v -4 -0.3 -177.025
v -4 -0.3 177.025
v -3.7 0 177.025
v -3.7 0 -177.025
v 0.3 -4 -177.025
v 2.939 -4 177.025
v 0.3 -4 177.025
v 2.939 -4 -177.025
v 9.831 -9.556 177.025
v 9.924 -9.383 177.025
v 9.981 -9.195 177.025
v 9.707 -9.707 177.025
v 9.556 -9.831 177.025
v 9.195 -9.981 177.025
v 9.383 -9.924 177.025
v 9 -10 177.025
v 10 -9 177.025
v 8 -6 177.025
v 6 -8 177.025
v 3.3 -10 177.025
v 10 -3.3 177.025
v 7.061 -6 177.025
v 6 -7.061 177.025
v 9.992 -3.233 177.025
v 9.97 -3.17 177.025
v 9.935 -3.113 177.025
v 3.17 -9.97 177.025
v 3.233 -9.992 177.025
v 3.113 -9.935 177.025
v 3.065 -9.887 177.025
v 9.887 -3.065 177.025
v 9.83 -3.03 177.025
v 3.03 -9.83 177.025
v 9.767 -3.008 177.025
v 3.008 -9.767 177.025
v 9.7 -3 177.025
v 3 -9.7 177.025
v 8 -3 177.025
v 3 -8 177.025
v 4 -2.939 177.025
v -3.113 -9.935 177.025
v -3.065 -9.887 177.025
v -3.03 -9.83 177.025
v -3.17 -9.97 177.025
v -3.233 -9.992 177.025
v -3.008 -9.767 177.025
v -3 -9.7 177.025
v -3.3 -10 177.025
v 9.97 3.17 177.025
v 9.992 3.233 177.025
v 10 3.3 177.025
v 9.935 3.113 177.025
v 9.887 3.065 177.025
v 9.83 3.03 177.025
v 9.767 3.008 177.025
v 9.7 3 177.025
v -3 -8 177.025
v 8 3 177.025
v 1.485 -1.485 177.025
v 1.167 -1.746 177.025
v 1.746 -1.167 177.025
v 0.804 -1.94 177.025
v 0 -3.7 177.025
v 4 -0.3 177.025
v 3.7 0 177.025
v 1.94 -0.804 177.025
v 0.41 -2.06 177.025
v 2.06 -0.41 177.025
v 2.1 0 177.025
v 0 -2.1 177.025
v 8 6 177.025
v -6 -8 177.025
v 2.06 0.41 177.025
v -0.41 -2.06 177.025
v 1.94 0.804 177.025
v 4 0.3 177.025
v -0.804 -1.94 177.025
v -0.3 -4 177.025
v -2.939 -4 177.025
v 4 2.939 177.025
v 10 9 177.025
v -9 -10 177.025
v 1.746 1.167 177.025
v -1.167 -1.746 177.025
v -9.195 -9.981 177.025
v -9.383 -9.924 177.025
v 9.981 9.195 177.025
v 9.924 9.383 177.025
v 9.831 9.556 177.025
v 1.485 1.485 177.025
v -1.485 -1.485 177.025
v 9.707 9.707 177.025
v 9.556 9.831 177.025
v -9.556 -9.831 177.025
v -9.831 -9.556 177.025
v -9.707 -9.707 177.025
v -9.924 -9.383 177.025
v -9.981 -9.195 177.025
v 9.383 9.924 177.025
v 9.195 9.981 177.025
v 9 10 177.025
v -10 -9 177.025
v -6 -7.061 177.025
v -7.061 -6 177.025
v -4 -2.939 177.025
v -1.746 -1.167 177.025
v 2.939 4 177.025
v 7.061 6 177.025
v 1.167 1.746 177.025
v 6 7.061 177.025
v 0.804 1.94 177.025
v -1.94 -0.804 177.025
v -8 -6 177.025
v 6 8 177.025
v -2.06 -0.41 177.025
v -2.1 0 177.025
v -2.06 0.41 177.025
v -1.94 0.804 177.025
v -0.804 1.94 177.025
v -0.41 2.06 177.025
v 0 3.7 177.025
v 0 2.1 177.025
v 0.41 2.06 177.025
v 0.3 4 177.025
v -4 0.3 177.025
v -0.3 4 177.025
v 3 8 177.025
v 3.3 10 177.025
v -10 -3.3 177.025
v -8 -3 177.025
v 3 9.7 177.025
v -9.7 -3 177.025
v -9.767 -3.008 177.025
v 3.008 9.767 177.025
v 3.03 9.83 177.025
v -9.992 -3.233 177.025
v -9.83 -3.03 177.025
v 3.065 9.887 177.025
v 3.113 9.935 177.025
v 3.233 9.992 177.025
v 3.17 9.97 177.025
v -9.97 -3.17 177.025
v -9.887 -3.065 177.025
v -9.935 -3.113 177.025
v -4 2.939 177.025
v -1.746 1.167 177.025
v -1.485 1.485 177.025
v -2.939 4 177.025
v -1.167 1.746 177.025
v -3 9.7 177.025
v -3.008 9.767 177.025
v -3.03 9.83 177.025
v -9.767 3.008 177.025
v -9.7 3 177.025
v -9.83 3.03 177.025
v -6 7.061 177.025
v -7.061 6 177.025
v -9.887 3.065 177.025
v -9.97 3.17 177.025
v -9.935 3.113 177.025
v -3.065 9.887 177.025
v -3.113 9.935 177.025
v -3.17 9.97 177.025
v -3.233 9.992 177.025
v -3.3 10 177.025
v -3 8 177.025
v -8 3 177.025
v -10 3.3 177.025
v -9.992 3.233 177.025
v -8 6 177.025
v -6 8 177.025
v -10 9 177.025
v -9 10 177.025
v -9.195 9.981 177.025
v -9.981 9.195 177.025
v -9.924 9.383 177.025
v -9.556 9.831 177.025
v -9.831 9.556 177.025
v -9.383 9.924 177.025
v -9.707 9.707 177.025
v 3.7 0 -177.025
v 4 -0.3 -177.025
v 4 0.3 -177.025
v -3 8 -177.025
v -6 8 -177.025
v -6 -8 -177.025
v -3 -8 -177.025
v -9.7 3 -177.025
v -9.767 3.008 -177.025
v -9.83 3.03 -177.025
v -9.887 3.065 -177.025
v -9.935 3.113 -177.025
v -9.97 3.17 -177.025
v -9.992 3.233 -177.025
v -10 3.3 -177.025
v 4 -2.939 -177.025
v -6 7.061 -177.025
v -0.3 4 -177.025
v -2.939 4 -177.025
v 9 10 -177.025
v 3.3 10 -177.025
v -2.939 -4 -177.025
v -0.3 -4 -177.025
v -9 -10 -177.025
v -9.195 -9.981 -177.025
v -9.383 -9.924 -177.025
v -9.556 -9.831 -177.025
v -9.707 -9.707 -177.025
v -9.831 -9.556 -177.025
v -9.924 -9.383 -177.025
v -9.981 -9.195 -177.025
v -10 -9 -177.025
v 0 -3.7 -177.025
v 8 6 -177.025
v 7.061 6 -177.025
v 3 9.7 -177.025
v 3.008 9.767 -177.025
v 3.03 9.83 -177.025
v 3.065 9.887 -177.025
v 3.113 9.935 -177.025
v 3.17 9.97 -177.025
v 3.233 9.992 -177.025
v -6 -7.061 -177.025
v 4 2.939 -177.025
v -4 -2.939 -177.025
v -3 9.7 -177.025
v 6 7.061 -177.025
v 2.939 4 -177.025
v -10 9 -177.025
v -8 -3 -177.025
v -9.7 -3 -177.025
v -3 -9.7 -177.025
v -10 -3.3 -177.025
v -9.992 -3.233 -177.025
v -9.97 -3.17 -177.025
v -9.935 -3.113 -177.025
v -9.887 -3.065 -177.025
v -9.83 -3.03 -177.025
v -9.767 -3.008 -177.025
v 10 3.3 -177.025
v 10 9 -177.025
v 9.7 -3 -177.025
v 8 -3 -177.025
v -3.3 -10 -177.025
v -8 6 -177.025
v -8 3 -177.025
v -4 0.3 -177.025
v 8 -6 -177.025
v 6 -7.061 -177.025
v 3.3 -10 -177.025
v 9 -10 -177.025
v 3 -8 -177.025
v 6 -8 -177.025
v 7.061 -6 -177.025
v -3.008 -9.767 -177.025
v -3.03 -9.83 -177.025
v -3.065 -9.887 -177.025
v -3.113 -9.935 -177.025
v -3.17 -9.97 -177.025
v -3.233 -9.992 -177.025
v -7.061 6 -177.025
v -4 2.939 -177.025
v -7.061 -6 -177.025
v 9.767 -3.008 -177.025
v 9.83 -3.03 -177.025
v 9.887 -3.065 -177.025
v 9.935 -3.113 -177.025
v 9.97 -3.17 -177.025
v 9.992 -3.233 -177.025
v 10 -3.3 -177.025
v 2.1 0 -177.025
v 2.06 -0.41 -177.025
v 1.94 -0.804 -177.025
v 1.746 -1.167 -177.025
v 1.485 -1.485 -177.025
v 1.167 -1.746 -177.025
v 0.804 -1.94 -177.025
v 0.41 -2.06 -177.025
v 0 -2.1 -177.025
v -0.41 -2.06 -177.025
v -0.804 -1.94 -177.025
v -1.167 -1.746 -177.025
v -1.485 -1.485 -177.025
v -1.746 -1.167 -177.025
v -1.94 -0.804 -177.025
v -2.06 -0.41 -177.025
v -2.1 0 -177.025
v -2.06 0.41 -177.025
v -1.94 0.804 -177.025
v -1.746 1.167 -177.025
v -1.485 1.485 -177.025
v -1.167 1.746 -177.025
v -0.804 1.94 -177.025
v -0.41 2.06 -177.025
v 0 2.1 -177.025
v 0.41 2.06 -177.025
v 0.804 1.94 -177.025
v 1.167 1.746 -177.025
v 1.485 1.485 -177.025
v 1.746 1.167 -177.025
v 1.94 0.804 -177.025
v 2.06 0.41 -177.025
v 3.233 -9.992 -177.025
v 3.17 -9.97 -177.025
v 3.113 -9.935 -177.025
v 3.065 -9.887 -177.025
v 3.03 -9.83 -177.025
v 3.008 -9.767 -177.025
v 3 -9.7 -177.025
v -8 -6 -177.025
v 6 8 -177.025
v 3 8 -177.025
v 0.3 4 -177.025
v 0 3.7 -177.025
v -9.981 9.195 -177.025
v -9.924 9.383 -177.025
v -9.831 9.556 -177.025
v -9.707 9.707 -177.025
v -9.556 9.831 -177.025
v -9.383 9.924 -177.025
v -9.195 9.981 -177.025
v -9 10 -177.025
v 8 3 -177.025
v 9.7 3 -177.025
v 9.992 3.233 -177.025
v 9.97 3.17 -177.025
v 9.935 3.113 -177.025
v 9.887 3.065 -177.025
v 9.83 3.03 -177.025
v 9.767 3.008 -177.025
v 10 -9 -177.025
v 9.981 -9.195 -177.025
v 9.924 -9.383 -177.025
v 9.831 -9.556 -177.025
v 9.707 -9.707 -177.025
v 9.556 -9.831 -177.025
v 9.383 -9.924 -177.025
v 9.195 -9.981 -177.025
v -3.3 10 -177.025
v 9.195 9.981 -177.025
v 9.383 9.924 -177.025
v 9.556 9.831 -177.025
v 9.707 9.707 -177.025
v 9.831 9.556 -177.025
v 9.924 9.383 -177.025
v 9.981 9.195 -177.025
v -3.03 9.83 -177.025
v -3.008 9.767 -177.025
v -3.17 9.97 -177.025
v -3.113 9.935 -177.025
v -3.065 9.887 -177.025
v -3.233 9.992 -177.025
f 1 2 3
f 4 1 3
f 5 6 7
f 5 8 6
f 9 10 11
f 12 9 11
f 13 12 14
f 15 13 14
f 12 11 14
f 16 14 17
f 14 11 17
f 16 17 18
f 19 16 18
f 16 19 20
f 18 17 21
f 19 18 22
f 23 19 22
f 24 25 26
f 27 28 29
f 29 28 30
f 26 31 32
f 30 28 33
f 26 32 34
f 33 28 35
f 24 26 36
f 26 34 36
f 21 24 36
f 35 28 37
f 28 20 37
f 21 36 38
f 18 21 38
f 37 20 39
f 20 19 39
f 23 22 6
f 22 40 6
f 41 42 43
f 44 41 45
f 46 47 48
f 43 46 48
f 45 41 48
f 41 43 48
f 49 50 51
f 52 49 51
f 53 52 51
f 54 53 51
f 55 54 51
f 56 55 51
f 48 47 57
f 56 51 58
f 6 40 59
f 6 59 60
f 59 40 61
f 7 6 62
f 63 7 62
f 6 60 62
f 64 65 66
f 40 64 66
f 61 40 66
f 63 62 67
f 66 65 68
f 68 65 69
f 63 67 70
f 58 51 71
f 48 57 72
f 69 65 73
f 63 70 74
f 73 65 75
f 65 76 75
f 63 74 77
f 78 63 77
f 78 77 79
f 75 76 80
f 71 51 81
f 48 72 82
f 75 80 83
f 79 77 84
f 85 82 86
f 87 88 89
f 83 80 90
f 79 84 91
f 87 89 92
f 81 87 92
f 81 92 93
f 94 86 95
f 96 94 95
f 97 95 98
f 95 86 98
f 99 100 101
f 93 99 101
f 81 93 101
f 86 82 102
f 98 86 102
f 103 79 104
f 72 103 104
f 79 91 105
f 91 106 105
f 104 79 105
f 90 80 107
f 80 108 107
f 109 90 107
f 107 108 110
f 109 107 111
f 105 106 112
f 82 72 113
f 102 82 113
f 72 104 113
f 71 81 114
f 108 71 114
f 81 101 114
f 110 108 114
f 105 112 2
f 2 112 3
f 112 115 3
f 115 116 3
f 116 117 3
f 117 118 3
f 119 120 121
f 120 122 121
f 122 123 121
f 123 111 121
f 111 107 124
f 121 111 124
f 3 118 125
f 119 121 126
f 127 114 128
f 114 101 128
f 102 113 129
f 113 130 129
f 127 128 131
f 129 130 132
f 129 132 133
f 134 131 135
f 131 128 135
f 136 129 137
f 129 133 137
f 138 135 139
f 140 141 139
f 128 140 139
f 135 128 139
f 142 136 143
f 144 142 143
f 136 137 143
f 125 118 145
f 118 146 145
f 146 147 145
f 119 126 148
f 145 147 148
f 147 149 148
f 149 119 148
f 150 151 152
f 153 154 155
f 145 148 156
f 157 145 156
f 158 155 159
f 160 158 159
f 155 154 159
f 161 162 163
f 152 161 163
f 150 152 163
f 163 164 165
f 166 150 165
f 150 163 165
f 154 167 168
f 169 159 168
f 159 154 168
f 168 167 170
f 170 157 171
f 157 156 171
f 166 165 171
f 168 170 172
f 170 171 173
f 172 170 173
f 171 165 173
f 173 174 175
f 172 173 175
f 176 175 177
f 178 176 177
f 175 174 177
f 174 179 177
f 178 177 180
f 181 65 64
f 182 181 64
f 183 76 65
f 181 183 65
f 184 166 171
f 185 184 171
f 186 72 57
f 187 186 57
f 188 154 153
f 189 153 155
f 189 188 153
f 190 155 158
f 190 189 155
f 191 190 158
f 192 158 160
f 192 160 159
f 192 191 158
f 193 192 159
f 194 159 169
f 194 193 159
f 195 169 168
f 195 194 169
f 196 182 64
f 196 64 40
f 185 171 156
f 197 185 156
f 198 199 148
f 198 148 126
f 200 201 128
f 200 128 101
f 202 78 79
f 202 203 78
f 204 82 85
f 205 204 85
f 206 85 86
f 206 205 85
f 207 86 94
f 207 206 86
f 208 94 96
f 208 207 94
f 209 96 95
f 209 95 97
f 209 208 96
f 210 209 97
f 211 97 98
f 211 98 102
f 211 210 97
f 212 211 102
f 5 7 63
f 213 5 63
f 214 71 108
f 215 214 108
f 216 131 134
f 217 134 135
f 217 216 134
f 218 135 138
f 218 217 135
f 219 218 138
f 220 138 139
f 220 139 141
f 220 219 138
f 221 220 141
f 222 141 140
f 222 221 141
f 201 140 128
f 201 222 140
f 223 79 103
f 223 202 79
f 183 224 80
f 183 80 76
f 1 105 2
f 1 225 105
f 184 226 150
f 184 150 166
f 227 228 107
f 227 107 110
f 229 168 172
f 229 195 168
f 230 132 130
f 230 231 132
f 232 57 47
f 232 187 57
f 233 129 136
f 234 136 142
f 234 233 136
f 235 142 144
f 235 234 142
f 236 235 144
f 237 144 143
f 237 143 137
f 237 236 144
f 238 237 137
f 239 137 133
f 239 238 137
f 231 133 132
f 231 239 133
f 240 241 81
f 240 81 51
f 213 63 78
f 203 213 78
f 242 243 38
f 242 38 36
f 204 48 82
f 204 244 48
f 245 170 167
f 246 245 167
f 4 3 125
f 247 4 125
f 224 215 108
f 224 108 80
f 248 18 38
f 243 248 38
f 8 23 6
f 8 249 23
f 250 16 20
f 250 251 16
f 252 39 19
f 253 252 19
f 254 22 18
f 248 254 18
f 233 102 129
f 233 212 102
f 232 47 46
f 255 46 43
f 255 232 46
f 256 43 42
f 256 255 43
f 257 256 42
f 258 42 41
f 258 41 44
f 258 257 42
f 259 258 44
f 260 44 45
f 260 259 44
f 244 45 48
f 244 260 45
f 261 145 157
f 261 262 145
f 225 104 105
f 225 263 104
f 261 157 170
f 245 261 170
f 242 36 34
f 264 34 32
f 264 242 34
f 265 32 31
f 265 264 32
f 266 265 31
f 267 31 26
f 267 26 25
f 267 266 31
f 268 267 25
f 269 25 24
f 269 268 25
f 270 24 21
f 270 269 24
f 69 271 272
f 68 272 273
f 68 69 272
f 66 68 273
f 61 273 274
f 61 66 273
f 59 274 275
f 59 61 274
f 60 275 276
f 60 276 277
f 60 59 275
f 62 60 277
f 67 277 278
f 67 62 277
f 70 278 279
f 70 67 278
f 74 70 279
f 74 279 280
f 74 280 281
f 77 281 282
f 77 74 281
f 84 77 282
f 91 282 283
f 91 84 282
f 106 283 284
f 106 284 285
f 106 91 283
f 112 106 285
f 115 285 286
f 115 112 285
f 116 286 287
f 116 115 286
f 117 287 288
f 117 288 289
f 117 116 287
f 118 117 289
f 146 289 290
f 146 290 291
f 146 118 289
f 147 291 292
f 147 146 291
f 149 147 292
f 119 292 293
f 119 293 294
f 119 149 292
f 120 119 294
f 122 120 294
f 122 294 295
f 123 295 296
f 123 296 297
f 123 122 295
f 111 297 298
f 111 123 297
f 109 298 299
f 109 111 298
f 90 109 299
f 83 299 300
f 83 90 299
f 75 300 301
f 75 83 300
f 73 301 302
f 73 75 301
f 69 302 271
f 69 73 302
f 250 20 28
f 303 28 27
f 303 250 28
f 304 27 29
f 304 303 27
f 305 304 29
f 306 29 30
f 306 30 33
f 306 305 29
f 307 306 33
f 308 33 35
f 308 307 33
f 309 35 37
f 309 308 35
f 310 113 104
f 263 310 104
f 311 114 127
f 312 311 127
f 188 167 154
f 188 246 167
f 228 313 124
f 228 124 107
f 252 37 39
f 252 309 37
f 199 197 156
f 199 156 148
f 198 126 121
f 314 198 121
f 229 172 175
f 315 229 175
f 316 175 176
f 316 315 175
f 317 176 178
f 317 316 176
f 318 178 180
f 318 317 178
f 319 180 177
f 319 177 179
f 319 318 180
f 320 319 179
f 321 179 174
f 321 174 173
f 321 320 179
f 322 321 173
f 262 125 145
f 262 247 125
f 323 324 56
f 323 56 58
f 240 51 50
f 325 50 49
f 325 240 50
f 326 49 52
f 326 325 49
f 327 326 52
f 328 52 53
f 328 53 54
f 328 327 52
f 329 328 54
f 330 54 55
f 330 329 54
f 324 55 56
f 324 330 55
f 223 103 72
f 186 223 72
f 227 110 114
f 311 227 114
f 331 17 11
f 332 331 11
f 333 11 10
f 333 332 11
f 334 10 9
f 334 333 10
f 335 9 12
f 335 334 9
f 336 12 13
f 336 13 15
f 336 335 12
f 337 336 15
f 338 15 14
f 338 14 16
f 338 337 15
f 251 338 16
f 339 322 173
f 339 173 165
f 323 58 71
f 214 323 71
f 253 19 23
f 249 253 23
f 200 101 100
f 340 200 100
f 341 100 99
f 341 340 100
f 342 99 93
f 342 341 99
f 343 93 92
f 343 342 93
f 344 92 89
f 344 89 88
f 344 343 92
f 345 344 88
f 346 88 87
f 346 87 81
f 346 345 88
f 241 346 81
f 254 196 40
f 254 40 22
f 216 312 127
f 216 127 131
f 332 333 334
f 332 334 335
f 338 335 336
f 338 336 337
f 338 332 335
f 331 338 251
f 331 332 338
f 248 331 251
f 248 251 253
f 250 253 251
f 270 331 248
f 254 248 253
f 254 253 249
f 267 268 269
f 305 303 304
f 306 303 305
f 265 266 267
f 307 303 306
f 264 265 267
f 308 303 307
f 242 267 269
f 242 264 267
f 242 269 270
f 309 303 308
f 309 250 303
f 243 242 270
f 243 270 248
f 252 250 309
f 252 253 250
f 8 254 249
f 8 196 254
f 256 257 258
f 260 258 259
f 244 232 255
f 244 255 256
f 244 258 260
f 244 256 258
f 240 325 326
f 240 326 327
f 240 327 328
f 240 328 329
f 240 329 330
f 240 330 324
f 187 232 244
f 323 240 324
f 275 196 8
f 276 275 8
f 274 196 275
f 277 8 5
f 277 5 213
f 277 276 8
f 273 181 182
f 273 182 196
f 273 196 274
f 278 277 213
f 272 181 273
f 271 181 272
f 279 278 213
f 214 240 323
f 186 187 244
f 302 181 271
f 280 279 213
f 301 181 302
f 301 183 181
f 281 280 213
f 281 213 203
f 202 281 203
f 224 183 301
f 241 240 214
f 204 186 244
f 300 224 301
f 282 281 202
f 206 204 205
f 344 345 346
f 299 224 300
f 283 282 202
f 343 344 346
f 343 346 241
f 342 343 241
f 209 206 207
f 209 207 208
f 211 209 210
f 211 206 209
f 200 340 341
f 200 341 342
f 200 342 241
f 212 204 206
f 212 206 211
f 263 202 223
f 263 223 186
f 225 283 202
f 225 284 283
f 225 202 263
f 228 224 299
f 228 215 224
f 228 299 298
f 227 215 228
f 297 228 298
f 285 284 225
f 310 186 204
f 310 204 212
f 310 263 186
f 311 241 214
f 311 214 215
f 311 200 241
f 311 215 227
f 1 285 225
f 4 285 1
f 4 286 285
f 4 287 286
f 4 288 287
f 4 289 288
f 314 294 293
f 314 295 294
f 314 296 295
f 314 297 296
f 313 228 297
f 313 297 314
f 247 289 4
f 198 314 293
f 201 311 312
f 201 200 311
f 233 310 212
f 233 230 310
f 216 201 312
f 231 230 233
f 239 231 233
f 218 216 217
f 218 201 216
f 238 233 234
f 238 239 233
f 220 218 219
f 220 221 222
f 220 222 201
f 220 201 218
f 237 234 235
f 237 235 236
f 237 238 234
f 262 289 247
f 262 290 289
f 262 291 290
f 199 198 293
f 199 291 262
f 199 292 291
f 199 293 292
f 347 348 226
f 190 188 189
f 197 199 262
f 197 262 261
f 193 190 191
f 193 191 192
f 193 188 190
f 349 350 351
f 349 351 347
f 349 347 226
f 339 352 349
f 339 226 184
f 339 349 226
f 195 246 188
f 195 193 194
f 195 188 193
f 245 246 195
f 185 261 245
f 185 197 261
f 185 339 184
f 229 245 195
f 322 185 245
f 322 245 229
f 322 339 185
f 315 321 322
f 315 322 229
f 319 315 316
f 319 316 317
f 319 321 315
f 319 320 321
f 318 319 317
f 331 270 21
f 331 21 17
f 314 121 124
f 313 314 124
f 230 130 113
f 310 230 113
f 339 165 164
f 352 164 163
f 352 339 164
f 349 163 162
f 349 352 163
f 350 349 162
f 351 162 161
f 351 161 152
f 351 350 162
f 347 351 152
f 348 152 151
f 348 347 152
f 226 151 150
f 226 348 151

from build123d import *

# Parameters (mm, degrees)
SKETCH1_R           = 2.1
BOSS_EXTRUDE1_DEPTH = 177.025


with BuildPart() as part:
    # Sketch1 → Boss-Extrude1 (new, symmetric)
    with BuildSketch(Plane(origin=(0, 0, 0), x_dir=(-1, 0, 0), z_dir=(0, 0, -1))):
        with BuildLine():
            Line((10, 3.3), (10, 9))
            ThreePointArc((10, 9), (9.707106781, 9.707106781), (9, 10))
            Line((9, 10), (3.3, 10))
            ThreePointArc((3.3, 10), (3.087867966, 9.912132034), (3, 9.7))
            Line((3, 9.7), (3, 8))
            Line((3, 8), (6, 8))
            Line((6, 8), (6, 7.060660172))
            Line((6, 7.060660172), (2.939339828, 4))
            Line((2.939339828, 4), (0.3, 4))
            Line((0.3, 4), (0, 3.7))
            Line((0, 3.7), (-0.3, 4))
            Line((-0.3, 4), (-2.939339828, 4))
            Line((-2.939339828, 4), (-6, 7.060660172))
            Line((-6, 7.060660172), (-6, 8))
            Line((-6, 8), (-3, 8))
            Line((-3, 8), (-3, 9.7))
            ThreePointArc((-3, 9.7), (-3.087867966, 9.912132034), (-3.3, 10))
            Line((-3.3, 10), (-9, 10))
            ThreePointArc((-9, 10), (-9.707106781, 9.707106781), (-10, 9))
            Line((-10, 9), (-10, 3.3))
            ThreePointArc((-10, 3.3), (-9.912132034, 3.087867966), (-9.7, 3))
            Line((-9.7, 3), (-8, 3))
            Line((-8, 3), (-8, 6))
            Line((-8, 6), (-7.060660172, 6))
            Line((-7.060660172, 6), (-4, 2.939339828))
            Line((-4, 2.939339828), (-4, 0.3))
            Line((-4, 0.3), (-3.7, 0))
            Line((-3.7, 0), (-4, -0.3))
            Line((-4, -0.3), (-4, -2.939339828))
            Line((-4, -2.939339828), (-7.060660172, -6))
            Line((-7.060660172, -6), (-8, -6))
            Line((-8, -6), (-8, -3))
            Line((-8, -3), (-9.7, -3))
            ThreePointArc((-9.7, -3), (-9.912132034, -3.087867966), (-10, -3.3))
            Line((-10, -3.3), (-10, -9))
            ThreePointArc((-10, -9), (-9.707106781, -9.707106781), (-9, -10))
            Line((-9, -10), (-3.3, -10))
            ThreePointArc((-3.3, -10), (-3.087867966, -9.912132034), (-3, -9.7))
            Line((-3, -9.7), (-3, -8))
            Line((-3, -8), (-6, -8))
            Line((-6, -8), (-6, -7.060660172))
            Line((-6, -7.060660172), (-2.939339828, -4))
            Line((-2.939339828, -4), (-0.3, -4))
            Line((-0.3, -4), (0, -3.7))
            Line((0, -3.7), (0.3, -4))
            Line((0.3, -4), (2.939339828, -4))
            Line((2.939339828, -4), (6, -7.060660172))
            Line((6, -7.060660172), (6, -8))
            Line((6, -8), (3, -8))
            Line((3, -8), (3, -9.7))
            ThreePointArc((3, -9.7), (3.087867966, -9.912132034), (3.3, -10))
            Line((3.3, -10), (9, -10))
            ThreePointArc((9, -10), (9.707106781, -9.707106781), (10, -9))
            Line((10, -9), (10, -3.3))
            ThreePointArc((10, -3.3), (9.912132034, -3.087867966), (9.7, -3))
            Line((9.7, -3), (8, -3))
            Line((8, -3), (8, -6))
            Line((8, -6), (7.060660172, -6))
            Line((7.060660172, -6), (4, -2.939339828))
            Line((4, -2.939339828), (4, -0.3))
            Line((4, -0.3), (3.7, 0))
            Line((3.7, 0), (4, 0.3))
            Line((4, 0.3), (4, 2.939339828))
            Line((4, 2.939339828), (7.060660172, 6))
            Line((7.060660172, 6), (8, 6))
            Line((8, 6), (8, 3))
            Line((8, 3), (9.7, 3))
            ThreePointArc((9.7, 3), (9.912132034, 3.087867966), (10, 3.3))
        make_face()
        Circle(SKETCH1_R, mode=Mode.SUBTRACT)
    extrude(amount=BOSS_EXTRUDE1_DEPTH, both=True)


solid = part.part
